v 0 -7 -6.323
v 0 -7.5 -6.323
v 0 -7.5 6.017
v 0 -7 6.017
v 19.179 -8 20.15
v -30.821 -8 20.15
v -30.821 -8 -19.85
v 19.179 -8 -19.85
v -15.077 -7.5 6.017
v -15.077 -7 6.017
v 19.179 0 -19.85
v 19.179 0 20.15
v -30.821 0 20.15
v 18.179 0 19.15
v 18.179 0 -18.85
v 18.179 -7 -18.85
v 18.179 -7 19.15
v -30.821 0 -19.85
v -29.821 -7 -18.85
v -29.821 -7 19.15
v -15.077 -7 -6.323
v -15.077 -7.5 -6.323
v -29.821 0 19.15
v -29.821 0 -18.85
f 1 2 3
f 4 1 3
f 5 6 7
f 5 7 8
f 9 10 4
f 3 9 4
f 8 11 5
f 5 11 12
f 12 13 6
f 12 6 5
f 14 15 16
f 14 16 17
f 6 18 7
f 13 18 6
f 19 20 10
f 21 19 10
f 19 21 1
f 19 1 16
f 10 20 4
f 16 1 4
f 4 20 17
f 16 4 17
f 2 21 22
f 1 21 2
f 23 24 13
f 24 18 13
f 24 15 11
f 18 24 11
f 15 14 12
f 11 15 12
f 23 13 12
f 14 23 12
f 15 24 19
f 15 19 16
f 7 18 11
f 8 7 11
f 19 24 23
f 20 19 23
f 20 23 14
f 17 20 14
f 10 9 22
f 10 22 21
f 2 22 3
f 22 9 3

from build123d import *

# Parameters (mm, degrees)
F0_W        = 50
F0_H        = 40
F1_DEPTH    = 8
F2_T        = -1
F3_W        = 15.0767099112
F3_H        = 12.3402951285
F4_DEPTH    = 10
F5_T        = 0.5
F5_T3_DEPTH = 8
F5_T5_DEPTH = 49
F5_T7_DEPTH = 39


# Not quite as in the source:
# - a shell that OpenCascade refuses in one call is made with other operations: the cavity is built on its own and cut out


with BuildPart() as f1:
    # F0 (on Front) → F1 (new body)
    with BuildSketch(Plane.XZ):
        with Locations((-5.8206513731, 0.1503955573)):
            Rectangle(F0_W, F0_H)
    extrude(amount=F1_DEPTH)

    # F2
    f2_openings = [f1.faces().sort_by_distance(p)[0] for p in [
        (-5.820651, 0, 0.150396),
    ]]
    offset(amount=F2_T, openings=f2_openings)

    # F3 (on face) → F4 (join)
    with BuildSketch(Plane(origin=(0, -7, 0), x_dir=(-1, 0, 0), z_dir=(0, 1, 0))):
        with Locations((7.5383549556, -0.1530931331)):
            Rectangle(F3_W, F3_H)
    extrude(amount=F4_DEPTH)

    # F5: shell of thickness 0.5, made by hand


with BuildPart() as f5_core1:
    # F5_t2: copy of F1
    add(f1.part)

    # the walls: a layer under each face that stays
    f5_faces = [f5_core1.faces().sort_by_distance(p)[0] for p in [
        (-5.8206513731, -4, 20.1503955573),
        (19.1793486269, -4, 0.1503955573),
        (-30.8206513731, -4, 0.1503955573),
        (11.3668486269, 0, -19.3557772822),
        (-5.8206513731, -8, 0.1503955573),
        (-5.8206513731, -4, -19.8496044427),
        (-5.8206513731, -3.5, 19.1503955573),
        (18.1793486269, -3.5, 0.1503955573),
        (-5.8206513731, -3.5, -18.8496044427),
        (-29.8206513731, -3.5, 0.1503955573),
        (-21.8206513731, -7, -12.5162711094),
    ]]
    thicken(f5_faces, amount=-F5_T, mode=Mode.SUBTRACT)

    # F5_s4 → F5_t3 (cut)
    with BuildSketch(Plane.XZ.offset(-0.5)):
        Polygon((18.1743486269, 19.1453955573), (18.1793486269, 19.6503955573), (18.6793486269, 19.6503955573), (18.6793486269, 19.1503955573), align=None)
        Polygon((-29.8156513731, 19.1453955573), (-29.8206513731, 19.6503955573), (-30.3206513731, 19.6503955573), (-30.3206513731, 19.1503955573), align=None)
        Polygon((18.1743486269, -18.8446044427), (18.6793486269, -18.8496044427), (18.6793486269, -19.3496044427), (18.1793486269, -19.3496044427), align=None)
        Polygon((-29.8156513731, -18.8446044427), (-29.8206513731, -19.3496044427), (-30.3206513731, -19.3496044427), (-30.3206513731, -18.8496044427), align=None)
    extrude(amount=F5_T3_DEPTH, mode=Mode.SUBTRACT)

    # F5_s6 → F5_t5 (cut)
    with BuildSketch(Plane.YZ.offset(-30.3206513731)):
        Polygon((-6.995, 19.1453955573), (-7, 19.6503955573), (-7.5, 19.6503955573), (-7.5, 19.1503955573), align=None)
        Polygon((-6.995, -18.8446044427), (-7, -19.3496044427), (-7.5, -19.3496044427), (-7.5, -18.8496044427), align=None)
    extrude(amount=F5_T5_DEPTH, mode=Mode.SUBTRACT)

    # F5_s8 → F5_t7 (cut)
    with BuildSketch(Plane.XY.offset(-19.3496044427)):
        Polygon((18.1743486269, -6.995), (18.6793486269, -7), (18.6793486269, -7.5), (18.1793486269, -7.5), align=None)
        Polygon((-29.8156513731, -6.995), (-30.3206513731, -7), (-30.3206513731, -7.5), (-29.8206513731, -7.5), align=None)
    extrude(amount=F5_T7_DEPTH, mode=Mode.SUBTRACT)


with BuildPart() as f1_1:
    add(f1.part)

    # what is left inside the walls is the cavity
    f5_cavity = [f5_core1.part.solids().sort_by_distance(p)[0] for p in [
        (-7.538355, -7.495, -2.209809),
    ]]
    add(f5_cavity, mode=Mode.SUBTRACT)


solid = f1_1.part
